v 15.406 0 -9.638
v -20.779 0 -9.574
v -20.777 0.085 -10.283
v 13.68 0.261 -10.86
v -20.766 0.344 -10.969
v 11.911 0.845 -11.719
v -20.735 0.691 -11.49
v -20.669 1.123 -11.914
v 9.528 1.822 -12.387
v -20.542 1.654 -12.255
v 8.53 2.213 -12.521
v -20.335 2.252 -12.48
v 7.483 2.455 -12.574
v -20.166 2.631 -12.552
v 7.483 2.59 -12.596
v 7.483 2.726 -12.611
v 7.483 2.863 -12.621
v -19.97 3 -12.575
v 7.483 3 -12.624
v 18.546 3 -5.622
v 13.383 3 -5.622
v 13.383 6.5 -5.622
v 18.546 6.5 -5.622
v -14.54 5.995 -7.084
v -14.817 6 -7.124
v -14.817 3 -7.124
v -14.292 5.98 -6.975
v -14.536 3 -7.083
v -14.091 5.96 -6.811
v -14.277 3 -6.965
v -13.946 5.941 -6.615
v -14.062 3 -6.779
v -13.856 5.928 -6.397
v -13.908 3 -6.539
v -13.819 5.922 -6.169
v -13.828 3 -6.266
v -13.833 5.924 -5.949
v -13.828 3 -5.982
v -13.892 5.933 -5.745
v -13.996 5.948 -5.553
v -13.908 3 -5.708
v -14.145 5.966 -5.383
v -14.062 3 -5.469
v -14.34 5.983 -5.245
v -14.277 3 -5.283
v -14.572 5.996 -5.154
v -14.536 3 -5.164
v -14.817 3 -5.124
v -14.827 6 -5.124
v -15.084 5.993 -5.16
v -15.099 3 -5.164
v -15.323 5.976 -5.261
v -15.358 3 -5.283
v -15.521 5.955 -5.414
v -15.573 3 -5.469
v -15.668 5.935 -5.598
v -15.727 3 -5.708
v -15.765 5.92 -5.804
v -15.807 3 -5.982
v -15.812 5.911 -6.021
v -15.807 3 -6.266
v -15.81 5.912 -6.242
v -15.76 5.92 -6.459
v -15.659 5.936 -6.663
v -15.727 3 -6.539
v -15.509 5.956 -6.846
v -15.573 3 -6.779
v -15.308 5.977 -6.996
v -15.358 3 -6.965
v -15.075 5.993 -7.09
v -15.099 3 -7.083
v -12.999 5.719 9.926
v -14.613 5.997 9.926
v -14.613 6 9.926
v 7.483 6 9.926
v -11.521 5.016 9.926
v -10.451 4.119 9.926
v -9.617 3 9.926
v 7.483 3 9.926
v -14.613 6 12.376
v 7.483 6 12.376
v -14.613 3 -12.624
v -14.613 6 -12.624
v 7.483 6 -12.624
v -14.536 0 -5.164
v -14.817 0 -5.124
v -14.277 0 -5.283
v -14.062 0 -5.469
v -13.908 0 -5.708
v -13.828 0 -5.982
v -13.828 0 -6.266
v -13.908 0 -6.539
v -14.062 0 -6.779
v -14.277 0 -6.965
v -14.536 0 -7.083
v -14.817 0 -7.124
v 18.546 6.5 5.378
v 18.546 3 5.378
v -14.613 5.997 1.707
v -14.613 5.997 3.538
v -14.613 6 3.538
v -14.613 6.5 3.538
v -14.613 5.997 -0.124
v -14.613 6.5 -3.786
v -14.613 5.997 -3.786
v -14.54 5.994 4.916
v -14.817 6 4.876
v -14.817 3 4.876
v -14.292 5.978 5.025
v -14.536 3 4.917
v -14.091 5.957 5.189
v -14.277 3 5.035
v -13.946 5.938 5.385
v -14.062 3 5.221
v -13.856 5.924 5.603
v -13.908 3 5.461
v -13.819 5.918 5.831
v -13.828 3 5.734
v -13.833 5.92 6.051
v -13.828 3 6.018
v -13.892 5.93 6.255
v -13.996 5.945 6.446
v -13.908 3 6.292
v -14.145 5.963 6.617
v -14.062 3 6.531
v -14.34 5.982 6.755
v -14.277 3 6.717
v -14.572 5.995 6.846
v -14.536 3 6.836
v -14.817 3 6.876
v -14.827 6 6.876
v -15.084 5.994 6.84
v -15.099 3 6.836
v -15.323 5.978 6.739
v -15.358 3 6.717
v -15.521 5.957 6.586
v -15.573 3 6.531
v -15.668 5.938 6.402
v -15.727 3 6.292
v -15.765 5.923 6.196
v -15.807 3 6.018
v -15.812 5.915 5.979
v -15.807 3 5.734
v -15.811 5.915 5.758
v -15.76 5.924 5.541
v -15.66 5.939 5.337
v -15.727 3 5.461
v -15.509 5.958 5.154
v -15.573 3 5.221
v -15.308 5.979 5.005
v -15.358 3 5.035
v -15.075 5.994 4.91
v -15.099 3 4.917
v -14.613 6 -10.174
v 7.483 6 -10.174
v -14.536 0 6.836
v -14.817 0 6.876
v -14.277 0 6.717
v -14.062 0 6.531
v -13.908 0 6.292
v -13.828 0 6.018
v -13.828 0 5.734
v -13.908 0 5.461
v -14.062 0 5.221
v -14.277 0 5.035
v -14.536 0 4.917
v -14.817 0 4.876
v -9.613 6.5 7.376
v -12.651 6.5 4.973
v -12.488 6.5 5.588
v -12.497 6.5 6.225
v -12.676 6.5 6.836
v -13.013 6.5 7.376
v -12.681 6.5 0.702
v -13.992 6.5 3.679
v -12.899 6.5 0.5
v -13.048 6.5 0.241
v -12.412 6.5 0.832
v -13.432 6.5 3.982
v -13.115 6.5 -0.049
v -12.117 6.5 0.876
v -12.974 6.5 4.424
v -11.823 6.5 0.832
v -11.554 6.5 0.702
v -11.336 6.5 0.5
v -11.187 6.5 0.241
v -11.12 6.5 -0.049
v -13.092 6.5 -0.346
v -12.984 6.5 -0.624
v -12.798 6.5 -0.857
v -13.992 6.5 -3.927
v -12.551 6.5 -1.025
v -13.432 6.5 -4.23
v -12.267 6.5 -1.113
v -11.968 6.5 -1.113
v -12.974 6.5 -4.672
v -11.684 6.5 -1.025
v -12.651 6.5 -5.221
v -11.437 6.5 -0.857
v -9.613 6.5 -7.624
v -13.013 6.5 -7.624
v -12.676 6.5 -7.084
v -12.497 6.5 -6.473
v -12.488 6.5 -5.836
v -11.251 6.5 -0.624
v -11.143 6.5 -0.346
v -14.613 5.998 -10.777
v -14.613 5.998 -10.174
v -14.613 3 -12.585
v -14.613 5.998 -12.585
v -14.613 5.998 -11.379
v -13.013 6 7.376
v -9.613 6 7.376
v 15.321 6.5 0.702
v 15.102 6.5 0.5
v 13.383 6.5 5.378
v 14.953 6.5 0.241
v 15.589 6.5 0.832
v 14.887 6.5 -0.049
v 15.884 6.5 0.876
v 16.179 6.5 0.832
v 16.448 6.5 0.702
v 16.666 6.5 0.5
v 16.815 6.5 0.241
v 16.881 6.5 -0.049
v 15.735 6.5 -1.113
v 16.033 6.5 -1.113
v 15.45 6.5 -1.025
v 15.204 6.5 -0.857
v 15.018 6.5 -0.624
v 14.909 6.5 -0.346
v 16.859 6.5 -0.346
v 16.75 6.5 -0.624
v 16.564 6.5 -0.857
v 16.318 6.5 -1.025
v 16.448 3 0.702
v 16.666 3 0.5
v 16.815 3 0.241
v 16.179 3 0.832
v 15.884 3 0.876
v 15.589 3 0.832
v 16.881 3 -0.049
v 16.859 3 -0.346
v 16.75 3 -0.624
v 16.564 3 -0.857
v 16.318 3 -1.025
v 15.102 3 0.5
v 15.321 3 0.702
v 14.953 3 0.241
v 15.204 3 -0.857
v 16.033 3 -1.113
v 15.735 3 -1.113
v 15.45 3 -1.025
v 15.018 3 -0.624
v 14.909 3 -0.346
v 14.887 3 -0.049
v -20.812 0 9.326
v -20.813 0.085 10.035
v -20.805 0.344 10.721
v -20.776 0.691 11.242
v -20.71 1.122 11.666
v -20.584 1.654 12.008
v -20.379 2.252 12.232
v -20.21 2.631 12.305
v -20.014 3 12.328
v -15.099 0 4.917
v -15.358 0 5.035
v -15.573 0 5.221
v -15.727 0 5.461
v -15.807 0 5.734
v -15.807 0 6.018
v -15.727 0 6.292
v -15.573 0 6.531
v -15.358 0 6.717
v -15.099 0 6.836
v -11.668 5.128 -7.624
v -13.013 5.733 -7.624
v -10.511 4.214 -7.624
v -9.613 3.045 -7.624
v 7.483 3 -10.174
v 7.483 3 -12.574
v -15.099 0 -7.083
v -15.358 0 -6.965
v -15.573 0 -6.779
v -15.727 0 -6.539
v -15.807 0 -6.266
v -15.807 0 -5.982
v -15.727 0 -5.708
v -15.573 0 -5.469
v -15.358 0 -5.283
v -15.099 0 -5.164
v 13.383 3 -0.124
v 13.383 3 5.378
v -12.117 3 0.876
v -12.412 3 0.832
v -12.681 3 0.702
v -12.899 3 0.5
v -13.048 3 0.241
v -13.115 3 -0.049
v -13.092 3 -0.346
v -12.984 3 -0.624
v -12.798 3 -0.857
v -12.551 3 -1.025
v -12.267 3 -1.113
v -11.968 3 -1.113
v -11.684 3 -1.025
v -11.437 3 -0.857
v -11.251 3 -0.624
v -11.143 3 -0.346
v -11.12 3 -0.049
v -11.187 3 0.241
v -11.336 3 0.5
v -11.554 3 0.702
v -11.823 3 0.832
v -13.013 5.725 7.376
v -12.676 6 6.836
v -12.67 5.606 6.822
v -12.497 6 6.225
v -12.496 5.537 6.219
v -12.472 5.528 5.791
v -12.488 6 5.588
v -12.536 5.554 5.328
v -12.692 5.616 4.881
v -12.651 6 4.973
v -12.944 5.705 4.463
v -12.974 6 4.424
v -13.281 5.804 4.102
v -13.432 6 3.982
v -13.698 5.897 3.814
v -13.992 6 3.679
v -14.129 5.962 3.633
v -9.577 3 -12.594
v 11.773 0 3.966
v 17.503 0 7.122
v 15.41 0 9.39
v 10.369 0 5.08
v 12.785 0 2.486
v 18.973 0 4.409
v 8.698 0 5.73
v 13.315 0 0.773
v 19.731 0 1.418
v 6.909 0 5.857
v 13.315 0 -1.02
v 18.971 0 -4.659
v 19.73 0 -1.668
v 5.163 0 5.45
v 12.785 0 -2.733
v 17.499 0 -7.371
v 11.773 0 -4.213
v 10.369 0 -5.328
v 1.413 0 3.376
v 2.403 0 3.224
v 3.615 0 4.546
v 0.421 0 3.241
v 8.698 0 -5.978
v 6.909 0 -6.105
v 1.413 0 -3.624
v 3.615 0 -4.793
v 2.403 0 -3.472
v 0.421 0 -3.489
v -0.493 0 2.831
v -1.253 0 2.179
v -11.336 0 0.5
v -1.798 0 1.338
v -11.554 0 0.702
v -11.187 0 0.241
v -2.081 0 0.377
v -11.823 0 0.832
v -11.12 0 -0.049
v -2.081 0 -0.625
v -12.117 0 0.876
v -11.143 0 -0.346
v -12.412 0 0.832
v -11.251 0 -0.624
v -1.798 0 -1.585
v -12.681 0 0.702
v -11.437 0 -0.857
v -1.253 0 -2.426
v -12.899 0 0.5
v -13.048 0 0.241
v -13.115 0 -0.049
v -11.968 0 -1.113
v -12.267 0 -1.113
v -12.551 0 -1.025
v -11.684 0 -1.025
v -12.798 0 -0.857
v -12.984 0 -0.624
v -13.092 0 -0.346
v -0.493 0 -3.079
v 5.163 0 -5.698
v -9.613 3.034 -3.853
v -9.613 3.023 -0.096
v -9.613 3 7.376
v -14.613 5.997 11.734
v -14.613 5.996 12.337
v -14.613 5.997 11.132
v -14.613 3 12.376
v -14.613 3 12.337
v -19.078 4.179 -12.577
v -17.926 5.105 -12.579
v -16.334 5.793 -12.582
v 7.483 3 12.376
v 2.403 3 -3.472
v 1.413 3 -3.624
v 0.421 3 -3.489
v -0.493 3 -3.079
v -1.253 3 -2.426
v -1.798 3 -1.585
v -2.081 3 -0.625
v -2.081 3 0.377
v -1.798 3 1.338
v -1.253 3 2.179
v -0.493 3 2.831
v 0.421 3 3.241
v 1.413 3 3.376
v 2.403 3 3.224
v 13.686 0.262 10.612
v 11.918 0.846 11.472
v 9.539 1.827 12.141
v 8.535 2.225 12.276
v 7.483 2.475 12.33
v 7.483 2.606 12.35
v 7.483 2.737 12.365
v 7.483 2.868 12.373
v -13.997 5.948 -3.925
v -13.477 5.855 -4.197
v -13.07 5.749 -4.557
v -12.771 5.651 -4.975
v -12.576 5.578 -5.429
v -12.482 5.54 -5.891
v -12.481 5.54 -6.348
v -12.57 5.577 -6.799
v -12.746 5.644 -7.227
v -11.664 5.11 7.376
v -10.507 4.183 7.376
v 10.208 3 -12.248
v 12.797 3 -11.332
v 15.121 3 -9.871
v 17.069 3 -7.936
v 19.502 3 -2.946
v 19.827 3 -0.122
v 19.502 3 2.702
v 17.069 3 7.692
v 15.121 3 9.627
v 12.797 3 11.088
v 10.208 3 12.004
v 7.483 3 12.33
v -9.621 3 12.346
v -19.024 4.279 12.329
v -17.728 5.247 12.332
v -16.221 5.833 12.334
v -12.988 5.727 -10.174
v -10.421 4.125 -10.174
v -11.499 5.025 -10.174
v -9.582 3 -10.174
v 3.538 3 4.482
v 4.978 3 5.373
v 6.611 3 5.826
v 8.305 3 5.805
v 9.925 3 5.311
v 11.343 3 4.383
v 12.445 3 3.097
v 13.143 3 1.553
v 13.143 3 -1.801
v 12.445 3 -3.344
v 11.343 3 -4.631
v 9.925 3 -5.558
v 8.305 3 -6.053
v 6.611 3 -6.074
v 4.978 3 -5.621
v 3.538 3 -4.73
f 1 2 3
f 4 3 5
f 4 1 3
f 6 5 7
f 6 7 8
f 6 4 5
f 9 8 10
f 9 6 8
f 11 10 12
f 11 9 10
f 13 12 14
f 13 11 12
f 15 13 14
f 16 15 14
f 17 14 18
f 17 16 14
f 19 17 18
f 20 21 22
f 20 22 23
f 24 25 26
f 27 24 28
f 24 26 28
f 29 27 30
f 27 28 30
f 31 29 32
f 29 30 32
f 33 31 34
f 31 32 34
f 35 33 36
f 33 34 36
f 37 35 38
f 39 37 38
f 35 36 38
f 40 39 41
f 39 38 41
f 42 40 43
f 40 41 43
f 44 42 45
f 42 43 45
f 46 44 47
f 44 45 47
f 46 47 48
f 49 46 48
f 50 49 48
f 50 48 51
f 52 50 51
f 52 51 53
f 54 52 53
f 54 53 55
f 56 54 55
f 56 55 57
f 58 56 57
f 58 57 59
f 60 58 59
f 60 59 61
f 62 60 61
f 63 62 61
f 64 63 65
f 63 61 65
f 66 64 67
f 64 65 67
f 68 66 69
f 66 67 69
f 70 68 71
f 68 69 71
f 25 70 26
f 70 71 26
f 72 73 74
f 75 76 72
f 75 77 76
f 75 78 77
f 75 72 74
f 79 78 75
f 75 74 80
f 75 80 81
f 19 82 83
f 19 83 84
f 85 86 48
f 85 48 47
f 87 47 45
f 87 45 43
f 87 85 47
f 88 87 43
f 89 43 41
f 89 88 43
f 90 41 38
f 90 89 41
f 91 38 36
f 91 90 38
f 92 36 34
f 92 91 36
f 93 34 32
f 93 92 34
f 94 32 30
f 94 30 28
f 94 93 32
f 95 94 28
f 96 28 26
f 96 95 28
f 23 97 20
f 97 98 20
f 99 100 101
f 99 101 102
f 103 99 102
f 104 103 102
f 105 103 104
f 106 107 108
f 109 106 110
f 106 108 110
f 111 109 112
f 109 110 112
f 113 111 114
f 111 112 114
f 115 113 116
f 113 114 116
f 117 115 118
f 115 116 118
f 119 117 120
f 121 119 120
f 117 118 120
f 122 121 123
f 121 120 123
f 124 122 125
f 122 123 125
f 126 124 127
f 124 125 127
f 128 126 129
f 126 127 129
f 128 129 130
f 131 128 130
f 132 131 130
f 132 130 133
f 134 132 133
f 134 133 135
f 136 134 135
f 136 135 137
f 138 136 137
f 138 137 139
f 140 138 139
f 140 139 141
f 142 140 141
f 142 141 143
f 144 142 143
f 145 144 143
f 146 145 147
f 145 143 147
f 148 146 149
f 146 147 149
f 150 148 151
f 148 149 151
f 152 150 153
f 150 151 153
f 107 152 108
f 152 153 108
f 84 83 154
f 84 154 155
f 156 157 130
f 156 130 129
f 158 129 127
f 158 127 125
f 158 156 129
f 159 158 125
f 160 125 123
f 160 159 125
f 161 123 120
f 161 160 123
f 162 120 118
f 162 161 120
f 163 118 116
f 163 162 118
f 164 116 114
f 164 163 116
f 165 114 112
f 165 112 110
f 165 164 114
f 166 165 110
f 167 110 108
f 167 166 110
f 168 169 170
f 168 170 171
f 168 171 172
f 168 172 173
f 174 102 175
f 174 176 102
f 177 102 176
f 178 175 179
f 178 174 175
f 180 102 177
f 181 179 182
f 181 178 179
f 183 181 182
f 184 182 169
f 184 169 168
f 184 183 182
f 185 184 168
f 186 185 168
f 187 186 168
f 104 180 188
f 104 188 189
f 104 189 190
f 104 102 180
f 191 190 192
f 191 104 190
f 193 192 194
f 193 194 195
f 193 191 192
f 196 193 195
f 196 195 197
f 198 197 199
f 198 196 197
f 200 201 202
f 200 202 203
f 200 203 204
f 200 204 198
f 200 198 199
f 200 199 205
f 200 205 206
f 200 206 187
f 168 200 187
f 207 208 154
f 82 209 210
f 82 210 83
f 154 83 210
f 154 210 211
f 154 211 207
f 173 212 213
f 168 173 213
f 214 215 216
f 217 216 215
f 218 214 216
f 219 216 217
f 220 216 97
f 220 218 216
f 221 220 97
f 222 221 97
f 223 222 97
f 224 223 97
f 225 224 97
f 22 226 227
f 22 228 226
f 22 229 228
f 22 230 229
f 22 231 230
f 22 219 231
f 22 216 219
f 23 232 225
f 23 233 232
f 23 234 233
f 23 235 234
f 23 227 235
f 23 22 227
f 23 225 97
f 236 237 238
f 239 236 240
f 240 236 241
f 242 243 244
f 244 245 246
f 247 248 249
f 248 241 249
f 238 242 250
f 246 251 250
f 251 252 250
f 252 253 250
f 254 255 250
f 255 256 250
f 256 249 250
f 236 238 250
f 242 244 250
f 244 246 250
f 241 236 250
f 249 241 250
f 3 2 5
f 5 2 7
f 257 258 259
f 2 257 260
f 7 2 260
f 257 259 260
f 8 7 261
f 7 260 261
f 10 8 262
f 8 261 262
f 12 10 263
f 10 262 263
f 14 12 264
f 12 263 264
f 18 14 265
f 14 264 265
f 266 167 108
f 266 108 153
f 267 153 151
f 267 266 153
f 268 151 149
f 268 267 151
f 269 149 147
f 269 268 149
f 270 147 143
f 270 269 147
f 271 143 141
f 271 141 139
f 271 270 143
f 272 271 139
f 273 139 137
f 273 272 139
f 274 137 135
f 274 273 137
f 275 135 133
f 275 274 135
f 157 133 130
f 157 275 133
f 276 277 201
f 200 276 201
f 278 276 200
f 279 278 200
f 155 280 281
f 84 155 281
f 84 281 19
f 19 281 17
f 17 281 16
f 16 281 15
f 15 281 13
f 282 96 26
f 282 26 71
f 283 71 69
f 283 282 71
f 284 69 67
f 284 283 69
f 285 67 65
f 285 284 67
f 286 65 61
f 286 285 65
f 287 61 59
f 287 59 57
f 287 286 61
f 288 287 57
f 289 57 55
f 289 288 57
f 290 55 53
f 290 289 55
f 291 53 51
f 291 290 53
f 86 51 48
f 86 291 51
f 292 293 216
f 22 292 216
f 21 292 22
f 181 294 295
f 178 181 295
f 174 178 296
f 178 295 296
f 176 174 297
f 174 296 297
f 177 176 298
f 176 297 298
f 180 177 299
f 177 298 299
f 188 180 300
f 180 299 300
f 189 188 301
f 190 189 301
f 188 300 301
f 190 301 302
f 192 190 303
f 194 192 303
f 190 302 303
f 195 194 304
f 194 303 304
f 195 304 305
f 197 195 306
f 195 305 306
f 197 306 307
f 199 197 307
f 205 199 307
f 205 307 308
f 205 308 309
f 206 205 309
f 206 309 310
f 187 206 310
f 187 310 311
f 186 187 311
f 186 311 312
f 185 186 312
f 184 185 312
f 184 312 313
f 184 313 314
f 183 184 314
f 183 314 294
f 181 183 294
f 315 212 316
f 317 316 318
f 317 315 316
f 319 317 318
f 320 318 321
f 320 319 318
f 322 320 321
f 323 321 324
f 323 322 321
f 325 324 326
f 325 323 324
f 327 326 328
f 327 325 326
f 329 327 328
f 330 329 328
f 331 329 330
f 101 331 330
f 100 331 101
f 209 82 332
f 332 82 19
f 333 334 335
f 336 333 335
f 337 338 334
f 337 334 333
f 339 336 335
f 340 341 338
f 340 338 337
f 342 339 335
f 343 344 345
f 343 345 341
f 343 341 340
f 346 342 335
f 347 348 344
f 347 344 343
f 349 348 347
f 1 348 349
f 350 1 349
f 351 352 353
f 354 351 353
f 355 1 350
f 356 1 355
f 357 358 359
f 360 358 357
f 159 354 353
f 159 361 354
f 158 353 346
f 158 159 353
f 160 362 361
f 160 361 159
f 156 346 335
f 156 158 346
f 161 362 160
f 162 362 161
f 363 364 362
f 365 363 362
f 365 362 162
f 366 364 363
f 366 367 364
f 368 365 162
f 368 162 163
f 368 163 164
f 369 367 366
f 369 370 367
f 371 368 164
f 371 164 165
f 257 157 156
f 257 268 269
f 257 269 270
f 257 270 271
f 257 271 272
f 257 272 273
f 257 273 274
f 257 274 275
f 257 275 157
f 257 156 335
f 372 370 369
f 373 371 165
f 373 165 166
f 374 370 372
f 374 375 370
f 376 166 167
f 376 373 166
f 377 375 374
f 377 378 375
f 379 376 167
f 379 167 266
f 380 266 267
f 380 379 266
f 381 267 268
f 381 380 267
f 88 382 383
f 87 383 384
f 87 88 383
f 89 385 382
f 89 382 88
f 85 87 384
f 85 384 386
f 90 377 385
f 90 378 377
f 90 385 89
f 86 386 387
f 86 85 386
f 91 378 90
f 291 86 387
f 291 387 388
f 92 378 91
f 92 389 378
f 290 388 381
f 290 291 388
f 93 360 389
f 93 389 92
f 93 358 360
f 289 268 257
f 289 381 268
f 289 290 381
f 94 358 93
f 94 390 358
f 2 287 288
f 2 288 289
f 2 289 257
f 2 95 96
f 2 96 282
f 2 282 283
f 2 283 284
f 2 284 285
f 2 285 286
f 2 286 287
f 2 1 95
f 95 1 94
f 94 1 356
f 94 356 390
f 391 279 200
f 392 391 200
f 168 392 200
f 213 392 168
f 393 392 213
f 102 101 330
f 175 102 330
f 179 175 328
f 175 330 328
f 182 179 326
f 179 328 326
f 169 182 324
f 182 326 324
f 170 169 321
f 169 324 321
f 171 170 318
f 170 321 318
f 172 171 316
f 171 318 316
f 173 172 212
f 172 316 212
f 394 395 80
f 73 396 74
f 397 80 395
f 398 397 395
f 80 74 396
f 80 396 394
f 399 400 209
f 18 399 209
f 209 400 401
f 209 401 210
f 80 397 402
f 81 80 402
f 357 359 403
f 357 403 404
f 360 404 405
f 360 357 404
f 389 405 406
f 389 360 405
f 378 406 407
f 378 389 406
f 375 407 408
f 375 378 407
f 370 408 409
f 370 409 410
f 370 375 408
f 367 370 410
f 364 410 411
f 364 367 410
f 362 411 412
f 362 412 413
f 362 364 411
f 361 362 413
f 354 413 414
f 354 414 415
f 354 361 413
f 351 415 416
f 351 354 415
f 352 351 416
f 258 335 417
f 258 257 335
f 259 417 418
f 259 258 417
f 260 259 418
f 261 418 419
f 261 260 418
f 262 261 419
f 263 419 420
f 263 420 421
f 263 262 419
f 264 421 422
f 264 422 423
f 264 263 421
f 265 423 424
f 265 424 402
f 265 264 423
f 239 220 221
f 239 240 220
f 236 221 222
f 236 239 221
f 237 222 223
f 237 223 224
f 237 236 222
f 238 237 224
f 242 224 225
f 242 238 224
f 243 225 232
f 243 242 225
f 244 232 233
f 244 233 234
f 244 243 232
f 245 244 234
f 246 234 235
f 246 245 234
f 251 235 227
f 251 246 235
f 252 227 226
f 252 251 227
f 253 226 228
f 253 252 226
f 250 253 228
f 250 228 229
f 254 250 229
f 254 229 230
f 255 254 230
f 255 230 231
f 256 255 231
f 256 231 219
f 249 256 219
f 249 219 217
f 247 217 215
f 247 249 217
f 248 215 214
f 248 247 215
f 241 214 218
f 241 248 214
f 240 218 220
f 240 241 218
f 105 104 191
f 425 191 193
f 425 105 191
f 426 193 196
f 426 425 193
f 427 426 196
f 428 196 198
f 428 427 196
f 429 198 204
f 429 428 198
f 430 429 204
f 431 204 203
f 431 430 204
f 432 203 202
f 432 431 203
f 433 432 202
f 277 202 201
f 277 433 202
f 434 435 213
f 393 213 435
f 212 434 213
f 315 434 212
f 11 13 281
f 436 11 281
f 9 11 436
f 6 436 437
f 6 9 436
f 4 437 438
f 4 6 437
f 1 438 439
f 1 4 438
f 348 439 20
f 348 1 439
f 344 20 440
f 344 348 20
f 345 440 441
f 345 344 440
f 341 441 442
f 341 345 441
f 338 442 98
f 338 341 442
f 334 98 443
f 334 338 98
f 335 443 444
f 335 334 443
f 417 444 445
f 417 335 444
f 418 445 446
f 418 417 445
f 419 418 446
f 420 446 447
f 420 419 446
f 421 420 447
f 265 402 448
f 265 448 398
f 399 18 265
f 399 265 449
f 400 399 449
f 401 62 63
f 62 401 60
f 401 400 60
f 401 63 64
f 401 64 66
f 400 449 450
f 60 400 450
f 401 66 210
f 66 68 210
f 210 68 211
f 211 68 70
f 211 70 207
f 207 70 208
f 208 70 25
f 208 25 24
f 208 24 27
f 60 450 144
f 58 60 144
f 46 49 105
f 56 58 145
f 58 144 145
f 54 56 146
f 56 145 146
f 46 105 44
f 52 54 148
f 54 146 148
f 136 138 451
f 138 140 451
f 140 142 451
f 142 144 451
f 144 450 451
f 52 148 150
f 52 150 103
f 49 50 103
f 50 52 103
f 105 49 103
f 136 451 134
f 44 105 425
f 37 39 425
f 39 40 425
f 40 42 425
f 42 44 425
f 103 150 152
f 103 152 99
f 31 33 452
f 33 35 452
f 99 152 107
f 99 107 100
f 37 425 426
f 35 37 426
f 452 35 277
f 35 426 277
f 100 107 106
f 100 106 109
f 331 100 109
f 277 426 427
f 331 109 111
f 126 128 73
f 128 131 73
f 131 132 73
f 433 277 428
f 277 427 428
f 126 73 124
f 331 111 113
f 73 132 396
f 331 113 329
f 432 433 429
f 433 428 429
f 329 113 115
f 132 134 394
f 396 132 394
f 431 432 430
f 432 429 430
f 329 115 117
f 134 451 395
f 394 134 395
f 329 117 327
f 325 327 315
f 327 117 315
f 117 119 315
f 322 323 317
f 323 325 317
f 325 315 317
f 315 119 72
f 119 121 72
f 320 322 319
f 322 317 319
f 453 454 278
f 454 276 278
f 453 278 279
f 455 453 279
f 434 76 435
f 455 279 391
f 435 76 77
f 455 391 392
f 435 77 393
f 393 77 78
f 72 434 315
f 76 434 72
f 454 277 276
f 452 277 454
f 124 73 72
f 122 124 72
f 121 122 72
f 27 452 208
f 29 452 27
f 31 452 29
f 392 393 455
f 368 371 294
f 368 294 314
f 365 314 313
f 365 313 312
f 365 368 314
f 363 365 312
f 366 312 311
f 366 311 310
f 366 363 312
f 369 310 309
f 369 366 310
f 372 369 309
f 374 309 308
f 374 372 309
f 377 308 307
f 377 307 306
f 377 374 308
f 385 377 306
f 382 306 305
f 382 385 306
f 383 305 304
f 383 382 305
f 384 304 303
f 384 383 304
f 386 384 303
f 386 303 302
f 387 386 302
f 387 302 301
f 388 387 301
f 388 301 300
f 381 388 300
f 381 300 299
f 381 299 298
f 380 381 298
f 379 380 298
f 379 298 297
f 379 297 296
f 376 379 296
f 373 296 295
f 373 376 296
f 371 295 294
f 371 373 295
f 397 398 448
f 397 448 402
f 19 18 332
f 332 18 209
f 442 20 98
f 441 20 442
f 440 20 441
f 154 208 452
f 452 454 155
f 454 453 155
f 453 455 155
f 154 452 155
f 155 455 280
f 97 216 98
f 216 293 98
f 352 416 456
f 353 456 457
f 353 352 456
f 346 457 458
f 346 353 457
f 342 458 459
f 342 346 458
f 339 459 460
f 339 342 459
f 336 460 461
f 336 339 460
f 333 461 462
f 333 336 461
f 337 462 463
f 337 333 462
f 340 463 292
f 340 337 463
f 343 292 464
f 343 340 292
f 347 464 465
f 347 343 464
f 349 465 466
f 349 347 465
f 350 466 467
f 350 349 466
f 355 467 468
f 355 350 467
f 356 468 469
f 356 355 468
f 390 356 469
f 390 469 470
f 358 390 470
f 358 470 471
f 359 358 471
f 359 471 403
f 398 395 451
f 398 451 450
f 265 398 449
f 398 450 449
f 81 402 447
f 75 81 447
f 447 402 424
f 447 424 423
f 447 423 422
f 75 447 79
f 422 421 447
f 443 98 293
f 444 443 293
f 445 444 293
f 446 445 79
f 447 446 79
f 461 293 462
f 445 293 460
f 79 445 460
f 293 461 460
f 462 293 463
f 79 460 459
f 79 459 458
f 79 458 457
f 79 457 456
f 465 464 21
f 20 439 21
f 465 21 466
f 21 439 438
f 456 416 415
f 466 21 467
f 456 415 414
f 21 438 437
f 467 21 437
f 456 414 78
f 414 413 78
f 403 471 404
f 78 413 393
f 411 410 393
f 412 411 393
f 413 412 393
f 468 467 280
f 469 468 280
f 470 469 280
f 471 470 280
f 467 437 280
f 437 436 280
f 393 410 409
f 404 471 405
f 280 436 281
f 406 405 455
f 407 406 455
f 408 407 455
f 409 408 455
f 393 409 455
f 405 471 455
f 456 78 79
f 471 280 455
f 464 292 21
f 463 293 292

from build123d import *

# Parameters (mm, degrees)
CROQUIS1_R              = 1.00000007
CROQUIS1_R_2            = 1.000000043
CROQUIS1_R_3            = 0.999999659
SALIENTE_EXTRUIR1_DEPTH = 3
SALIENTE_EXTRUIR2_REACH = 34.647
CROQUIS3_W              = 22.095085155
CROQUIS3_H              = 2.45
CROQUIS3_W_2            = 5.163600355
CROQUIS3_H_2            = 11
CROQUIS3_R              = 1
SALIENTE_EXTRUIR3_DEPTH = 3
CROQUIS4_W              = 5.163600355
CROQUIS4_H              = 11
CROQUIS4_R              = 1
SALIENTE_EXTRUIR4_DEPTH = 0.5
CORTAR_EXTRUIR1_DEPTH   = 30.5
CROQUIS6_R              = 1.000000043
CROQUIS6_R_2            = 1.00000007
CROQUIS6_R_3            = 0.999999659
CORTAR_EXTRUIR2_DEPTH   = 30.5
REDONDEO1_R             = 3


with BuildPart() as part:
    # Croquis1 → Saliente-Extruir1 (new body)
    with BuildSketch(Plane(origin=(0, 0, 0), x_dir=(1, 0, 0), z_dir=(0, 1, 0))):
        with BuildLine():
            Line((-20.817493094, 12.573865304), (7.482507574, 12.623865495))
            Line((7.482507574, 12.623865495), (7.482507574, 12.573916185))
            ThreePointArc((7.482507574, 12.573916185), (19.826569133, 0.122006117), (7.482507574, -12.329903951))
            Line((7.482507574, -12.329903951), (7.482507574, -12.376134505))
            Line((7.482507574, -12.376134505), (-20.817493094, -12.326134314))
            Line((-20.817493094, -12.326134314), (-20.817493094, 12.573865304))
        make_face()
        with Locations(Location((-12.11749246, 0.123865663, 0), (0, 0, 270))):
            Circle(CROQUIS1_R, mode=Mode.SUBTRACT)
        with Locations(Location((-14.817492891, 6.123865452, 0), (0, 0, 270))):
            Circle(CROQUIS1_R_2, mode=Mode.SUBTRACT)
        with Locations(Location((-14.817492524, -5.876134505, 0), (0, 0, 270))):
            Circle(CROQUIS1_R_3, mode=Mode.SUBTRACT)
        with BuildLine():
            ThreePointArc((2.403340998, -3.223954765), (13.382507625, 0.123866695), (2.403340083, 3.471685154))
            ThreePointArc((2.403340083, 3.471685154), (-2.117492981, 0.123864576), (2.403340998, -3.223954765))
        make_face(mode=Mode.SUBTRACT)
    extrude(amount=SALIENTE_EXTRUIR1_DEPTH)

    # Saliente-Extruir2: up to this plane
    saliente_extruir2_end = Plane(origin=(-20.817493094, 3, -12.573865304), z_dir=(0.001766788392819182, 0, 0.9999984392281696))
    # Croquis2 → Saliente-Extruir2 (add, up to the surface)
    with BuildSketch(Plane(origin=(-0.02184262, 0, 12.362875885), x_dir=(0.9999984392281696, 0, 0.001766788392856574), z_dir=(-0.001766788392856574, 0, 0.9999984392281696)), mode=Mode.PRIVATE) as saliente_extruir2_sk1:
        with BuildLine():
            Line((-9.599530509, 3), (-19.991835354, 3))
            ThreePointArc((-19.991835354, 3), (-14.795682931, 6), (-9.599530509, 3))
        make_face()
    saliente_extruir2_tool1 = split(extrude(saliente_extruir2_sk1.sketch, amount=-SALIENTE_EXTRUIR2_REACH, mode=Mode.PRIVATE), bisect_by=saliente_extruir2_end, keep=Keep.BOTH, mode=Mode.PRIVATE)
    add(saliente_extruir2_tool1.solids().sort_by_distance((-14.817502, 4.230121, 12.336735))[0])

    # Croquis3 → Saliente-Extruir3 (add)
    # profile 1 of 4: a face of its own
    with BuildSketch(Plane(origin=(0, 3, 0), x_dir=(1, 0, 0), z_dir=(0, 1, 0))):
        with Locations((-3.565035003, -11.151134505)):
            Rectangle(CROQUIS3_W, CROQUIS3_H)
    # profile 2 of 4: a face of its own
    with BuildSketch(Plane(origin=(0, 3, 0), x_dir=(1, 0, 0), z_dir=(0, 1, 0))):
        with Locations((-3.565035003, 11.398865495)):
            Rectangle(CROQUIS3_W, CROQUIS3_H)
    # profile 3 of 4: a face of its own
    with BuildSketch(Plane(origin=(0, 3, 0), x_dir=(1, 0, 0), z_dir=(0, 1, 0))):
        with BuildLine():
            Line((-13.012577984, 7.623865495), (-9.612577581, 7.623865495))
            Line((-9.612577581, 7.623865495), (-9.612577581, -7.376134505))
            Line((-9.612577581, -7.376134505), (-13.012577581, -7.376134505))
            ThreePointArc((-13.012577581, -7.376134505), (-12.651343128, -4.973075952), (-14.612577581, -3.538244886))
            Line((-14.612577581, -3.538244886), (-14.612577581, 3.785975877))
            ThreePointArc((-14.612577581, 3.785975877), (-12.651343414, 5.220807096), (-13.012577984, 7.623865495))
        make_face()
    # profile 4 of 4: a face of its own
    with BuildSketch(Plane(origin=(0, 3, 0), x_dir=(1, 0, 0), z_dir=(0, 1, 0))):
        with Locations((15.964307803, 0.122006117)):
            Rectangle(CROQUIS3_W_2, CROQUIS3_H_2)
        with Locations(Location((15.884187935, 0.123865875, 0), (0, 0, 270))):
            Circle(CROQUIS3_R, mode=Mode.SUBTRACT)
    extrude(amount=SALIENTE_EXTRUIR3_DEPTH)

    # Croquis4 → Saliente-Extruir4 (add)
    # profile 1 of 2: a face of its own
    with BuildSketch(Plane(origin=(0, 6, 0), x_dir=(1, 0, 0), z_dir=(0, 1, 0))):
        with Locations((15.964307803, 0.122006117)):
            Rectangle(CROQUIS4_W, CROQUIS4_H)
        with Locations(Location((15.884187935, 0.123865875, 0), (0, 0, 270))):
            Circle(CROQUIS4_R, mode=Mode.SUBTRACT)
    # profile 2 of 2: a face of its own
    with BuildSketch(Plane(origin=(0, 6, 0), x_dir=(1, 0, 0), z_dir=(0, 1, 0))):
        with BuildLine():
            Line((-13.012577576, -7.376134508), (-9.612577581, -7.376134505))
            Line((-9.612577581, -7.376134505), (-9.612577581, 7.623865495))
            Line((-9.612577581, 7.623865495), (-13.012577984, 7.623865495))
            ThreePointArc((-13.012577984, 7.623865495), (-12.651343414, 5.220807096), (-14.612577581, 3.785975877))
            Line((-14.612577581, 3.785975877), (-14.612577581, -3.538244892))
            ThreePointArc((-14.612577581, -3.538244892), (-12.651343124, -4.97307595), (-13.012577576, -7.376134508))
        make_face()
    extrude(amount=SALIENTE_EXTRUIR4_DEPTH)

    # Croquis5 → Cortar-Extruir1 (cut)
    with BuildSketch(Plane(origin=(-0.02184262, 0, 12.362875885), x_dir=(0.9999984392281696, 0, 0.001766788392856574), z_dir=(-0.001766788392856574, 0, 0.9999984392281696))):
        with BuildLine():
            ThreePointArc((-19.991835354, 3), (-17.725768159, 5.235895392), (-14.634858473, 5.997844237))
            Line((-14.634858473, 5.997844237), (-14.634858473, 8.229597487))
            ThreePointArc((-14.634858473, 8.229597487), (-20.558857666, 5.876900228), (-23.026851701, 0))
            Line((-23.026851701, 0), (-20.795682931, 0))
            Line((-20.795682931, 0), (-20.795682931, 3))
            Line((-20.795682931, 3), (-19.991835354, 3))
        make_face()
        with BuildLine():
            ThreePointArc((-20.795682931, 0), (-20.591237889, 1.552914271), (-19.991835354, 3))
            Line((-19.991835354, 3), (-20.795682931, 3))
            Line((-20.795682931, 3), (-20.795682931, 0))
        make_face()
    extrude(amount=-CORTAR_EXTRUIR1_DEPTH, mode=Mode.SUBTRACT)

    # Croquis6 → Cortar-Extruir2 (cut)
    with BuildSketch(Plane.XZ):
        with Locations(Location((-14.817492891, -6.123865452, 0), (0, 0, 270))):
            Circle(CROQUIS6_R)
        with Locations(Location((-12.11749246, -0.123865663, 0), (0, 0, 90))):
            Circle(CROQUIS6_R_2)
        with Locations(Location((-14.817492524, 5.876134505, 0), (0, 0, 270))):
            Circle(CROQUIS6_R_3)
    extrude(amount=-CORTAR_EXTRUIR2_DEPTH, mode=Mode.SUBTRACT)

    # Redondeo1
    redondeo1_edges = [part.edges().sort_by_distance(p)[0] for p in [
        (-6.645496142, 0, -12.598904263),
        (-6.66749276, 0, 12.35113441),
    ]]
    fillet(redondeo1_edges, radius=REDONDEO1_R - 0.0001)  # a hair under: the kernel refuses the full size


solid = part.part
